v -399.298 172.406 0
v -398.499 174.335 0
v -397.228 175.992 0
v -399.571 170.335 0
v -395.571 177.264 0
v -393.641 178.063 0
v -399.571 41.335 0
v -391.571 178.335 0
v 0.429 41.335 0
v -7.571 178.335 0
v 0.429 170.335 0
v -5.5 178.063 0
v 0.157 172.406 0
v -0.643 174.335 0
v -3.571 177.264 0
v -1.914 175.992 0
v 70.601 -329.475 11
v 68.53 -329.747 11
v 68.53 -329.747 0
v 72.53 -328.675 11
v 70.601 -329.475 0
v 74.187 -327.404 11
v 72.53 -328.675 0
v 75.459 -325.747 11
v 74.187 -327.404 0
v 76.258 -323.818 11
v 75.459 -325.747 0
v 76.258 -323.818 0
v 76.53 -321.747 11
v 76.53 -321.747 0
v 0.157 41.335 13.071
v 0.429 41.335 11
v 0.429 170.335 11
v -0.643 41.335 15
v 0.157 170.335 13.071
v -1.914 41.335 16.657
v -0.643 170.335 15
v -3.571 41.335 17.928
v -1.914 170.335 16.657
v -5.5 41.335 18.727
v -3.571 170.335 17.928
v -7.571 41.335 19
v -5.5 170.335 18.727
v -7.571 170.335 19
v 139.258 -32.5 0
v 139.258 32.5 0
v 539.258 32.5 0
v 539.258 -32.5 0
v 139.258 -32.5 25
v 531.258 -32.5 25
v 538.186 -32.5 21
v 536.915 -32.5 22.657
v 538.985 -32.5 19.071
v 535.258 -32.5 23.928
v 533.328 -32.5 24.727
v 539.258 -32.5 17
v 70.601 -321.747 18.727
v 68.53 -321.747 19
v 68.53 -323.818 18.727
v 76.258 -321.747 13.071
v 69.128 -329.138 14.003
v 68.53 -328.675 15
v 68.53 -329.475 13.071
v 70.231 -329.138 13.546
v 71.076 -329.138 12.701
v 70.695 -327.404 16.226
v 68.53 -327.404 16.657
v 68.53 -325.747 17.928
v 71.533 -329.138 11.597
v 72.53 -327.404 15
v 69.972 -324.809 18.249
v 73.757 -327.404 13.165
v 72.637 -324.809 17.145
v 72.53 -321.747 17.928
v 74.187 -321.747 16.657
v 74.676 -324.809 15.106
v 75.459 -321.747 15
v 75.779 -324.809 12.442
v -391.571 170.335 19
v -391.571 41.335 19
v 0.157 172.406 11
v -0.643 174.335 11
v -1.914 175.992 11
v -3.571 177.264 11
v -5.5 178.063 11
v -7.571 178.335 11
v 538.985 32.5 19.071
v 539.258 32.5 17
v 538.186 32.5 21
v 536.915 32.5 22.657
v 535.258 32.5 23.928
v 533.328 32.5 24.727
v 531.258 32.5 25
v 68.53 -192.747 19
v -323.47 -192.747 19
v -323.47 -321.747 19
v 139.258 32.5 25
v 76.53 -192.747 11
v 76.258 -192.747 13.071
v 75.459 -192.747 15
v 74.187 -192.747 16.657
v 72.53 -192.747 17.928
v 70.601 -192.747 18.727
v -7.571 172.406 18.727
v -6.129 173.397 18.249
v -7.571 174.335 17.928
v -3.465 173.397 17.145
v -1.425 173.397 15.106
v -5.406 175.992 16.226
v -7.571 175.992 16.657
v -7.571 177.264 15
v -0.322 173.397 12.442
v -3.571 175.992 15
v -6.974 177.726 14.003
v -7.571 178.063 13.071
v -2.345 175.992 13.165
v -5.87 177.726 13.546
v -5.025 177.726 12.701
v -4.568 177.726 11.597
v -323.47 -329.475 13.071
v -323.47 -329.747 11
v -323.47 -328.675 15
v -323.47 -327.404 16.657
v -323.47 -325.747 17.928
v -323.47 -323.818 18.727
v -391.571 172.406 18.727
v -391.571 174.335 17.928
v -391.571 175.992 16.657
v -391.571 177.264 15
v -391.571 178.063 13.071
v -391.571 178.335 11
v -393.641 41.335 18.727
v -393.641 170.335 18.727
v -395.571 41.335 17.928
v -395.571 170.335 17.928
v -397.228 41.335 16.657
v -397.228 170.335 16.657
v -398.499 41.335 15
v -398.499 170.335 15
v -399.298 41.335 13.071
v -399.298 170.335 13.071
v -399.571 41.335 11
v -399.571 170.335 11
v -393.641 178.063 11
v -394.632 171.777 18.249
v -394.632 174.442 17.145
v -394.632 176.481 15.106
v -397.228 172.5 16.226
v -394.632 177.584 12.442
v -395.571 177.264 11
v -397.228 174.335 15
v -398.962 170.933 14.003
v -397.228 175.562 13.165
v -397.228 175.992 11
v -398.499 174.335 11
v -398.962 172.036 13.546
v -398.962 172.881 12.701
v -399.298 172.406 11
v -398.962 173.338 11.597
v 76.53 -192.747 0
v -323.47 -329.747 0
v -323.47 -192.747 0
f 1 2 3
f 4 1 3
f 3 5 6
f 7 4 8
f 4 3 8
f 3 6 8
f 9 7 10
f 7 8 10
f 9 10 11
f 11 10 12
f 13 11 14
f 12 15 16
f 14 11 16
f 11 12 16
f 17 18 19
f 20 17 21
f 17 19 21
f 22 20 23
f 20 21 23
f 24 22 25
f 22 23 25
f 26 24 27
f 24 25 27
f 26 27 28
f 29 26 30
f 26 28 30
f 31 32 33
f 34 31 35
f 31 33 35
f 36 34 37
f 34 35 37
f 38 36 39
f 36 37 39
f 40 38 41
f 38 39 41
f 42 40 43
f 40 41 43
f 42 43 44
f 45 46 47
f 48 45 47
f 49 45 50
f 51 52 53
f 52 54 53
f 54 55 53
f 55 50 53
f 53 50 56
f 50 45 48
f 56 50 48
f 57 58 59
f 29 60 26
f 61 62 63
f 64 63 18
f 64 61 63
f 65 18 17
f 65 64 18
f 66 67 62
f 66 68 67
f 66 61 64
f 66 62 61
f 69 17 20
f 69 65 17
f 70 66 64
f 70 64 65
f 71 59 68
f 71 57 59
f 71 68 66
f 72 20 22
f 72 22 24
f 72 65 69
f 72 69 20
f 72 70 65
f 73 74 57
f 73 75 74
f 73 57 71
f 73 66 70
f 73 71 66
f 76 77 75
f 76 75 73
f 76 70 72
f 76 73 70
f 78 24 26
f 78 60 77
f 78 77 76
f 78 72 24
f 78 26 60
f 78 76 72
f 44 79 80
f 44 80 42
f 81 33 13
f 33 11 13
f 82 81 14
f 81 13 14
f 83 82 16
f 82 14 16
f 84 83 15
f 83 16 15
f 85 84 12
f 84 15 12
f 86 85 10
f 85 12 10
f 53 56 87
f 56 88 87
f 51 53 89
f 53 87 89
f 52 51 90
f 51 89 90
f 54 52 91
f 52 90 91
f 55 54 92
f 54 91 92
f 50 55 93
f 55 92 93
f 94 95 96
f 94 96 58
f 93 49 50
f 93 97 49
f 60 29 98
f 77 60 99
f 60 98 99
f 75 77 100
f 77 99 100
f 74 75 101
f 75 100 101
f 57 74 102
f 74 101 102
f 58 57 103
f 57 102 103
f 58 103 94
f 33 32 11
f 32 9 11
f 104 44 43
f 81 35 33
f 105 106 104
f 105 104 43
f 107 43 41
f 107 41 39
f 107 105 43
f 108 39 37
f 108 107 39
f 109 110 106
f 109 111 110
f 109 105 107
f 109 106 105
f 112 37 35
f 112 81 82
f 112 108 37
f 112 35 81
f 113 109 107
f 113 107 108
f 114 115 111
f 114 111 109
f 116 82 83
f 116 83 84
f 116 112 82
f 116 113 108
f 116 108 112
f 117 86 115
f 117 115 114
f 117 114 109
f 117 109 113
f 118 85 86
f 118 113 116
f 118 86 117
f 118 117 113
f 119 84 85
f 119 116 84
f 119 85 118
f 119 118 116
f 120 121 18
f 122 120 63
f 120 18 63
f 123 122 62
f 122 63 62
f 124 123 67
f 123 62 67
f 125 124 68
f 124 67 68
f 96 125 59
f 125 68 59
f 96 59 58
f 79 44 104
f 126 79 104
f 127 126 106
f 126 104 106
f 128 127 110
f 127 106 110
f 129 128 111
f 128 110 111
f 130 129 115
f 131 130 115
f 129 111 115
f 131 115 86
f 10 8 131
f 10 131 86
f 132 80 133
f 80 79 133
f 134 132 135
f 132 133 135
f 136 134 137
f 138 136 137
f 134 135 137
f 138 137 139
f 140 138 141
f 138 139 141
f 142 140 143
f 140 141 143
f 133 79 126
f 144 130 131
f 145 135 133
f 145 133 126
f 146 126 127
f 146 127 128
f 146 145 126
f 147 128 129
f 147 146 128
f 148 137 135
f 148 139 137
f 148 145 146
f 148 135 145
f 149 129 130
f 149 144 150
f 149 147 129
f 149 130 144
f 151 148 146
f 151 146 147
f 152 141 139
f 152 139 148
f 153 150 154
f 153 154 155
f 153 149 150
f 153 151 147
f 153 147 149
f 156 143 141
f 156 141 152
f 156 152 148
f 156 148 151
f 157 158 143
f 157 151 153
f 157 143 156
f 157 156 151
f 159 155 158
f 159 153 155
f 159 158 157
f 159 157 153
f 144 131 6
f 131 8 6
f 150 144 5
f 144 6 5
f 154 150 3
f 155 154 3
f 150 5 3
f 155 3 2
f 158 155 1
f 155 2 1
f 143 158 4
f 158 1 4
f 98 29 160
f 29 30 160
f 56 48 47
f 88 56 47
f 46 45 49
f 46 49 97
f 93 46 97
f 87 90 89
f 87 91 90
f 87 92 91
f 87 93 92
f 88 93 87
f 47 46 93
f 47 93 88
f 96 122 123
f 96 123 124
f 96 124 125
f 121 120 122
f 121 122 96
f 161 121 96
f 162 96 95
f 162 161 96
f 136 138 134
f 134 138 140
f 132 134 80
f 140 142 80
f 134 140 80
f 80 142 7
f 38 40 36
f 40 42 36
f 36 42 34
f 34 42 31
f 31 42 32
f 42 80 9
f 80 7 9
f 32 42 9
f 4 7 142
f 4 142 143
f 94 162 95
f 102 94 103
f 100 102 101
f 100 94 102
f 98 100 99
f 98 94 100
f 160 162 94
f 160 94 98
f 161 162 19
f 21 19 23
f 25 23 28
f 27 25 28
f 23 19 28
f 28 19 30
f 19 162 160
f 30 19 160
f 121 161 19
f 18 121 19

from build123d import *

# Parameters (mm, degrees)
F0_W     = 400
F0_H     = 137
F3_DEPTH = 19
F1_W     = 400
F1_H     = 137
F4_DEPTH = 19
F2_W     = 400
F2_H     = 65
F5_DEPTH = 25
F6_R     = 8
F7_R     = 8
F8_R     = 8
F9_R     = 8
F10_R    = 8
F11_R    = 8


with BuildPart() as f3:
    # F0 (on Top) → F3 (new body)
    with BuildSketch(Plane.XY):
        with Locations((-199.570805, 109.835393)):
            Rectangle(F0_W, F0_H)
    extrude(amount=F3_DEPTH)

    # F6
    f6_edges = [f3.edges().sort_by_distance(p)[0] for p in [
        (0.429195, 109.835393, 19),
    ]]
    fillet(f6_edges, radius=F6_R)

    # F10
    f10_edges = [f3.edges().sort_by_distance(p)[0] for p in [
        (-203.570805, 178.335393, 19),
    ]]
    fillet(f10_edges, radius=F10_R)

    # F11
    f11_edges = [f3.edges().sort_by_distance(p)[0] for p in [
        (-399.570805, 105.835393, 19),
    ]]
    fillet(f11_edges, radius=F11_R)


with BuildPart() as f4:
    # F1 (on Top) → F4 (new body)
    with BuildSketch(Plane.XY):
        with Locations((-123.469599, -261.247193)):
            Rectangle(F1_W, F1_H)
    extrude(amount=F4_DEPTH)

    # F8
    f8_edges = [f4.edges().sort_by_distance(p)[0] for p in [
        (76.530401, -261.247193, 19),
    ]]
    fillet(f8_edges, radius=F8_R)

    # F9
    f9_edges = [f4.edges().sort_by_distance(p)[0] for p in [
        (-127.469599, -329.747193, 19),
    ]]
    fillet(f9_edges, radius=F9_R)


with BuildPart() as f5:
    # F2 (on Top) → F5 (new body)
    with BuildSketch(Plane.XY):
        with Locations((339.257847, 0)):
            Rectangle(F2_W, F2_H)
    extrude(amount=F5_DEPTH)

    # F7
    f7_edges = [f5.edges().sort_by_distance(p)[0] for p in [
        (539.257847, 0, 25),
    ]]
    fillet(f7_edges, radius=F7_R)


solid = Compound([f3.part, f4.part, f5.part])
